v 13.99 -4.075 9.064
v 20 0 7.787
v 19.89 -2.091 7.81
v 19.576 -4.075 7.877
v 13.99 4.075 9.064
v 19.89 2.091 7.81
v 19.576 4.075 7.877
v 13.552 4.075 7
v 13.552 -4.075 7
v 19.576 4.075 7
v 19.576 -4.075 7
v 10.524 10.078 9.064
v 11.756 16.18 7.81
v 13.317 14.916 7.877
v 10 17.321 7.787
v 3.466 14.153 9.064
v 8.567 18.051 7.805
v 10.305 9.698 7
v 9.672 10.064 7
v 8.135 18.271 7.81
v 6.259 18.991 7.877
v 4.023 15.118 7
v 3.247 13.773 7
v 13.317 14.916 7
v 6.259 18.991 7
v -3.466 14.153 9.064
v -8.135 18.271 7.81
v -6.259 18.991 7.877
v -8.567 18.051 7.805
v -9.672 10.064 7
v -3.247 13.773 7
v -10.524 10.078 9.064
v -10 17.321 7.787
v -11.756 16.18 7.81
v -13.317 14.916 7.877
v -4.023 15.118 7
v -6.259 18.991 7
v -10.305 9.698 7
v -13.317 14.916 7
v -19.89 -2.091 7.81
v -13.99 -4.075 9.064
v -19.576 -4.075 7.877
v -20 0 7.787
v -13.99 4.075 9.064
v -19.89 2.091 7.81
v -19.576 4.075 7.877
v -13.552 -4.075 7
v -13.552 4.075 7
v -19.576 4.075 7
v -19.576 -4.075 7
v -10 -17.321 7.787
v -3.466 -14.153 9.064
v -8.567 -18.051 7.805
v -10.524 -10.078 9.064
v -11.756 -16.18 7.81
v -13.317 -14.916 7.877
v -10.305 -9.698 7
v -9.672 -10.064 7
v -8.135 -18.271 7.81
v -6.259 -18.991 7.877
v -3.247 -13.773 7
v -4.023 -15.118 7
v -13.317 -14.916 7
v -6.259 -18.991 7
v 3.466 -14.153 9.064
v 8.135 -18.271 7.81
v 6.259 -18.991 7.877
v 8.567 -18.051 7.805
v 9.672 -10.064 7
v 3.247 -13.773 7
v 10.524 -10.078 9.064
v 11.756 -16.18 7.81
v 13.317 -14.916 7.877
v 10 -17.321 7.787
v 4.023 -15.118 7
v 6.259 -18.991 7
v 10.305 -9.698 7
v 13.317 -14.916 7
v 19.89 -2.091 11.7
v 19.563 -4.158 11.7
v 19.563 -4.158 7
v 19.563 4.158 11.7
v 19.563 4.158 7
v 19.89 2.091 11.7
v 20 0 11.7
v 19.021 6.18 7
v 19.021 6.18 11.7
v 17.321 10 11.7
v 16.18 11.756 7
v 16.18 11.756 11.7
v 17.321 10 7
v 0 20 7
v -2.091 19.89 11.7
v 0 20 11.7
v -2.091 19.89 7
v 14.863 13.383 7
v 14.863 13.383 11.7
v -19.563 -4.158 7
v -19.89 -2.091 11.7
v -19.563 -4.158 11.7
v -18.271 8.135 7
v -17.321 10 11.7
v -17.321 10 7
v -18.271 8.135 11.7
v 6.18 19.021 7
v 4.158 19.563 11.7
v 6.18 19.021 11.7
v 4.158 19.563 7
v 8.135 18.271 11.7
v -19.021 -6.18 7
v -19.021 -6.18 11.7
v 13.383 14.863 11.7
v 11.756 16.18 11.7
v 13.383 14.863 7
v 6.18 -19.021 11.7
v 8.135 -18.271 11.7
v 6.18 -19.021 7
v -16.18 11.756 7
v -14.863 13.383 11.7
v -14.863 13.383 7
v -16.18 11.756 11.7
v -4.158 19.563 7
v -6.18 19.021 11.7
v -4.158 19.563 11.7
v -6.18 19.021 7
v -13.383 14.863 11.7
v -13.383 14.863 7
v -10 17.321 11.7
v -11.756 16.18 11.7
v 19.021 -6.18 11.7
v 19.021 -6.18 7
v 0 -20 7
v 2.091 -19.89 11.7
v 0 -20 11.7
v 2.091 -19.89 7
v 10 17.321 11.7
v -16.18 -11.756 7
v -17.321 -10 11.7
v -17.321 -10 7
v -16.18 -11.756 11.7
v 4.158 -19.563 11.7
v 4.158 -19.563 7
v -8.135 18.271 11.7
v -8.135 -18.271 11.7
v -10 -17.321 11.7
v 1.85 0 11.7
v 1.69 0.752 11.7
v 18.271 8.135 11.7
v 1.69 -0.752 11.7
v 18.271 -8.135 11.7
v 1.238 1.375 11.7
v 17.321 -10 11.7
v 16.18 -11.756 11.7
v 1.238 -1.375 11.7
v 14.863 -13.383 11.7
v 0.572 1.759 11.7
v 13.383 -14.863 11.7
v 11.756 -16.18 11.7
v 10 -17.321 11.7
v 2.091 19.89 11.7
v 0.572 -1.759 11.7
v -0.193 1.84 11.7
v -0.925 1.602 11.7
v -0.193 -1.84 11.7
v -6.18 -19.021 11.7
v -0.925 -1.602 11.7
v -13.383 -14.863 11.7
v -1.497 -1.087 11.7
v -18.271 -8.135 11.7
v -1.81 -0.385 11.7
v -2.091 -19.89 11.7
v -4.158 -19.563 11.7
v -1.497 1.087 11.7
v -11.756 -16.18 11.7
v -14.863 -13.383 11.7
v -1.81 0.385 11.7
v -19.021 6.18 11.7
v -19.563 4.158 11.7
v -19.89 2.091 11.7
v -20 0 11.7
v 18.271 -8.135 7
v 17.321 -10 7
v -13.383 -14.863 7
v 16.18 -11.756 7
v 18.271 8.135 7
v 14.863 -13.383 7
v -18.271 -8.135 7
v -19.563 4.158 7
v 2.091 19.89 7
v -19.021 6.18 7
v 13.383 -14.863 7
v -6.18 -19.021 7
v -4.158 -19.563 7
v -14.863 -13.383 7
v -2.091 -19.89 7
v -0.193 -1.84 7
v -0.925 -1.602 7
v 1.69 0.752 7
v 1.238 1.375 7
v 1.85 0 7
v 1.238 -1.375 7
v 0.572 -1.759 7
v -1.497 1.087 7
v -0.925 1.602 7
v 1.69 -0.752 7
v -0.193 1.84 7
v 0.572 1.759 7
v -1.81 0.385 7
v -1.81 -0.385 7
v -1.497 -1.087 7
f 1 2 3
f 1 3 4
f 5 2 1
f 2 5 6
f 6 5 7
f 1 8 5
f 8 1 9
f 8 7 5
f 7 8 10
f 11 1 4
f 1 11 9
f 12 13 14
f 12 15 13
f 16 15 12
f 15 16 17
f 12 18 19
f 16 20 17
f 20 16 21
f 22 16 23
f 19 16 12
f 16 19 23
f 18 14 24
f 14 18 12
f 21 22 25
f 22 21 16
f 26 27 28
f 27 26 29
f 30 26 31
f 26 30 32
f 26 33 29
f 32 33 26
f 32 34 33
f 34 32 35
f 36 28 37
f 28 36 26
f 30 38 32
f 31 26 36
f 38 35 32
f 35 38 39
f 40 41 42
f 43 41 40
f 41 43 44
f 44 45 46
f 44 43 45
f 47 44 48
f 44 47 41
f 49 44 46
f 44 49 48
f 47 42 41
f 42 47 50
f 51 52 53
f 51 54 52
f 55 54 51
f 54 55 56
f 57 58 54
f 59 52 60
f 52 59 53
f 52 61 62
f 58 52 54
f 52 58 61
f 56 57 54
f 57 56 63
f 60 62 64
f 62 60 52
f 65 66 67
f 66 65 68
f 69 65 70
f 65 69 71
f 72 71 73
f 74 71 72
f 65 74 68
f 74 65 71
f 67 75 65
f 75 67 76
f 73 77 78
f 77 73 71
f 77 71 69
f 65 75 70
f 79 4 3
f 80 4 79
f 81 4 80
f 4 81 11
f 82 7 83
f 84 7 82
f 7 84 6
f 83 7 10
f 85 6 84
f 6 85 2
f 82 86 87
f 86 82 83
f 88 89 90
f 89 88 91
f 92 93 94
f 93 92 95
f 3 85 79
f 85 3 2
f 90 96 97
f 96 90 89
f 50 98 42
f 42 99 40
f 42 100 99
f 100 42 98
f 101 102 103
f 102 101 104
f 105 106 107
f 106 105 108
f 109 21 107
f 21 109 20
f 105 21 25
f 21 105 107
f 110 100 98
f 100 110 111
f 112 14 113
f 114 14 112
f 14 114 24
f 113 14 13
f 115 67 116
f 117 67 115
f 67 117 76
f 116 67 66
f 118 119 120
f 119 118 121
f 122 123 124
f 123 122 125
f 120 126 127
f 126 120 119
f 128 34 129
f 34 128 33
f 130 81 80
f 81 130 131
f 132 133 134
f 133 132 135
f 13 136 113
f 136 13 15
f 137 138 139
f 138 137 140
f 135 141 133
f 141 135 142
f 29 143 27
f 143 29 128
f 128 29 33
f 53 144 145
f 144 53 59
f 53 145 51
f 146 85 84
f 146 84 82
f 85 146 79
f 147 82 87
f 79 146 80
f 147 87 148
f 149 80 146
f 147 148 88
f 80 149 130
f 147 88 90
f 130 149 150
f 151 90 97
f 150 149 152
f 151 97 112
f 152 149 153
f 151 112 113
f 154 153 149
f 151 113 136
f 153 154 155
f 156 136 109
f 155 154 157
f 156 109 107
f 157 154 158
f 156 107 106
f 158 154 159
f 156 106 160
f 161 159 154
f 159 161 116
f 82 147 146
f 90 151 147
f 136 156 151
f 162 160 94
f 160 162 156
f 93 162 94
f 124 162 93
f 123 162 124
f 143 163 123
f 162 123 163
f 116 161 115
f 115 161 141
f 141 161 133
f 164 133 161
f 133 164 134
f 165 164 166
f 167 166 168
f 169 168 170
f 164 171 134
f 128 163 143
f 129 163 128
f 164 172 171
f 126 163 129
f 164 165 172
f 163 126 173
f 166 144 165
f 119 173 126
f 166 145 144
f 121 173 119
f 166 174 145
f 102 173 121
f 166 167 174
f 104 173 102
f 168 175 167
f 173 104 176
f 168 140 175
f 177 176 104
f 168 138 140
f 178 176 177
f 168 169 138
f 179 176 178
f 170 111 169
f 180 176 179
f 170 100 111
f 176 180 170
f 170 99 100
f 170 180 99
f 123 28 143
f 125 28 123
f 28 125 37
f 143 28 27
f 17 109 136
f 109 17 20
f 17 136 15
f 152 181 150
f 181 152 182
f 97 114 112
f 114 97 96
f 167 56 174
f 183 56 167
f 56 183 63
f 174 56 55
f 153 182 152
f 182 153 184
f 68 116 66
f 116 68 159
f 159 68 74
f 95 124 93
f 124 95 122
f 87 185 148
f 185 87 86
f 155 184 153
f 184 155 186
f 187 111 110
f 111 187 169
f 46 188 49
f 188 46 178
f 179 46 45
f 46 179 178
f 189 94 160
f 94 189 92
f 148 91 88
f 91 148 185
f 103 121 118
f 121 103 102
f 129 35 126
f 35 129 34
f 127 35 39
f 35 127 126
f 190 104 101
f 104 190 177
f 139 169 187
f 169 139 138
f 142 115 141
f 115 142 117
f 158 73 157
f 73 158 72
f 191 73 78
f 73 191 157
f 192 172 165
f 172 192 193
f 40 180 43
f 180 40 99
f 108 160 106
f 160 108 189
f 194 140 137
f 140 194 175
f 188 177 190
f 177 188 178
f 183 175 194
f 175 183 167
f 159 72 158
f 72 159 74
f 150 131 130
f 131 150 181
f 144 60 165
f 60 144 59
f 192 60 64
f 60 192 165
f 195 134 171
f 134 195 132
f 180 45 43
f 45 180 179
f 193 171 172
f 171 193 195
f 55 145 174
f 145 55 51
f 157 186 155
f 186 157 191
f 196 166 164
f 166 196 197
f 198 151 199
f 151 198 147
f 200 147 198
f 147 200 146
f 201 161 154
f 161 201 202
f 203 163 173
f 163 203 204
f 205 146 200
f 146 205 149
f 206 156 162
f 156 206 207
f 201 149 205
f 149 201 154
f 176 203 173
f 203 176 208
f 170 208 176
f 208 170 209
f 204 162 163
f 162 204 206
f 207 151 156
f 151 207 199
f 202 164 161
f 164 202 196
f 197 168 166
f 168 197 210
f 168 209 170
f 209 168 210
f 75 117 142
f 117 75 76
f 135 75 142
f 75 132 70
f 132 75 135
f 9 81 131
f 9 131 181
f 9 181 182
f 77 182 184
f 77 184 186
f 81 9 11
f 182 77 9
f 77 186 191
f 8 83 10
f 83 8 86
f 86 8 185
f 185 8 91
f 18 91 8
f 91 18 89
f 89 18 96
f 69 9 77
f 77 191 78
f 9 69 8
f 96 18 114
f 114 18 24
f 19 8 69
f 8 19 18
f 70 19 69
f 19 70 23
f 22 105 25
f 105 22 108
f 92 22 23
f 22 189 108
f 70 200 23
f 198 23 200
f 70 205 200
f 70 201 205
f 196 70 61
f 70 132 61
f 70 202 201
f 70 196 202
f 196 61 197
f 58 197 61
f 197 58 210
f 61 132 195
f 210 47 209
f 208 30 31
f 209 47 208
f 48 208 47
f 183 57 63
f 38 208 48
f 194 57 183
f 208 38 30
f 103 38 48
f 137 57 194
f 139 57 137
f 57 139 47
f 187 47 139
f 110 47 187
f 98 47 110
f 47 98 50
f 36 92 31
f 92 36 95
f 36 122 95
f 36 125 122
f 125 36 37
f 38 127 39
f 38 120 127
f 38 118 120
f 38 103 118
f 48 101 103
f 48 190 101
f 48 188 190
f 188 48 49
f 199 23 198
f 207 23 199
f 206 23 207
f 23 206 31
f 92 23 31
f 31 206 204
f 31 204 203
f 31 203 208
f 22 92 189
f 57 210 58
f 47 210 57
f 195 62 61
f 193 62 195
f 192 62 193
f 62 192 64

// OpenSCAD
angle=12;
offset=-2.3;

//difference(){
//translate([0,0,offset])cylinder(d=40,h=30,$fn=60,center=true);
//cylinder(d=3.7,h=60,$fn=15,center=true);
//for(i=[0:60:330]){
//rotate([0,0,i])
//rotate([0,angle,0])translate([21.80,0,0])
//cube([20,8.15,23.55],center=true);
//}
//translate([0,0,-12])cylinder(d=50,h=30);
//}
//difference(){
//translate([0,0,-17.3])cylinder(d=10,h=12,$fn=30);
//cylinder(d=2.7,h=100,$fn=12,center=true);
//}

difference(){
translate([0,0,offset])cylinder(d=40,h=28,$fn=60,center=true);
cylinder(d=3.7,h=60,$fn=15,center=true);
for(i=[0:60:330]){
rotate([0,0,i])
rotate([0,angle,0])translate([21.80,0,0])
cube([20,8.15,23.55],center=true);
}
translate([0,0,-23])cylinder(d=50,h=30);
}

%rotate([0,angle,0])translate([21.80,0,0])
cube([20,8.15,23.55],center=true);
